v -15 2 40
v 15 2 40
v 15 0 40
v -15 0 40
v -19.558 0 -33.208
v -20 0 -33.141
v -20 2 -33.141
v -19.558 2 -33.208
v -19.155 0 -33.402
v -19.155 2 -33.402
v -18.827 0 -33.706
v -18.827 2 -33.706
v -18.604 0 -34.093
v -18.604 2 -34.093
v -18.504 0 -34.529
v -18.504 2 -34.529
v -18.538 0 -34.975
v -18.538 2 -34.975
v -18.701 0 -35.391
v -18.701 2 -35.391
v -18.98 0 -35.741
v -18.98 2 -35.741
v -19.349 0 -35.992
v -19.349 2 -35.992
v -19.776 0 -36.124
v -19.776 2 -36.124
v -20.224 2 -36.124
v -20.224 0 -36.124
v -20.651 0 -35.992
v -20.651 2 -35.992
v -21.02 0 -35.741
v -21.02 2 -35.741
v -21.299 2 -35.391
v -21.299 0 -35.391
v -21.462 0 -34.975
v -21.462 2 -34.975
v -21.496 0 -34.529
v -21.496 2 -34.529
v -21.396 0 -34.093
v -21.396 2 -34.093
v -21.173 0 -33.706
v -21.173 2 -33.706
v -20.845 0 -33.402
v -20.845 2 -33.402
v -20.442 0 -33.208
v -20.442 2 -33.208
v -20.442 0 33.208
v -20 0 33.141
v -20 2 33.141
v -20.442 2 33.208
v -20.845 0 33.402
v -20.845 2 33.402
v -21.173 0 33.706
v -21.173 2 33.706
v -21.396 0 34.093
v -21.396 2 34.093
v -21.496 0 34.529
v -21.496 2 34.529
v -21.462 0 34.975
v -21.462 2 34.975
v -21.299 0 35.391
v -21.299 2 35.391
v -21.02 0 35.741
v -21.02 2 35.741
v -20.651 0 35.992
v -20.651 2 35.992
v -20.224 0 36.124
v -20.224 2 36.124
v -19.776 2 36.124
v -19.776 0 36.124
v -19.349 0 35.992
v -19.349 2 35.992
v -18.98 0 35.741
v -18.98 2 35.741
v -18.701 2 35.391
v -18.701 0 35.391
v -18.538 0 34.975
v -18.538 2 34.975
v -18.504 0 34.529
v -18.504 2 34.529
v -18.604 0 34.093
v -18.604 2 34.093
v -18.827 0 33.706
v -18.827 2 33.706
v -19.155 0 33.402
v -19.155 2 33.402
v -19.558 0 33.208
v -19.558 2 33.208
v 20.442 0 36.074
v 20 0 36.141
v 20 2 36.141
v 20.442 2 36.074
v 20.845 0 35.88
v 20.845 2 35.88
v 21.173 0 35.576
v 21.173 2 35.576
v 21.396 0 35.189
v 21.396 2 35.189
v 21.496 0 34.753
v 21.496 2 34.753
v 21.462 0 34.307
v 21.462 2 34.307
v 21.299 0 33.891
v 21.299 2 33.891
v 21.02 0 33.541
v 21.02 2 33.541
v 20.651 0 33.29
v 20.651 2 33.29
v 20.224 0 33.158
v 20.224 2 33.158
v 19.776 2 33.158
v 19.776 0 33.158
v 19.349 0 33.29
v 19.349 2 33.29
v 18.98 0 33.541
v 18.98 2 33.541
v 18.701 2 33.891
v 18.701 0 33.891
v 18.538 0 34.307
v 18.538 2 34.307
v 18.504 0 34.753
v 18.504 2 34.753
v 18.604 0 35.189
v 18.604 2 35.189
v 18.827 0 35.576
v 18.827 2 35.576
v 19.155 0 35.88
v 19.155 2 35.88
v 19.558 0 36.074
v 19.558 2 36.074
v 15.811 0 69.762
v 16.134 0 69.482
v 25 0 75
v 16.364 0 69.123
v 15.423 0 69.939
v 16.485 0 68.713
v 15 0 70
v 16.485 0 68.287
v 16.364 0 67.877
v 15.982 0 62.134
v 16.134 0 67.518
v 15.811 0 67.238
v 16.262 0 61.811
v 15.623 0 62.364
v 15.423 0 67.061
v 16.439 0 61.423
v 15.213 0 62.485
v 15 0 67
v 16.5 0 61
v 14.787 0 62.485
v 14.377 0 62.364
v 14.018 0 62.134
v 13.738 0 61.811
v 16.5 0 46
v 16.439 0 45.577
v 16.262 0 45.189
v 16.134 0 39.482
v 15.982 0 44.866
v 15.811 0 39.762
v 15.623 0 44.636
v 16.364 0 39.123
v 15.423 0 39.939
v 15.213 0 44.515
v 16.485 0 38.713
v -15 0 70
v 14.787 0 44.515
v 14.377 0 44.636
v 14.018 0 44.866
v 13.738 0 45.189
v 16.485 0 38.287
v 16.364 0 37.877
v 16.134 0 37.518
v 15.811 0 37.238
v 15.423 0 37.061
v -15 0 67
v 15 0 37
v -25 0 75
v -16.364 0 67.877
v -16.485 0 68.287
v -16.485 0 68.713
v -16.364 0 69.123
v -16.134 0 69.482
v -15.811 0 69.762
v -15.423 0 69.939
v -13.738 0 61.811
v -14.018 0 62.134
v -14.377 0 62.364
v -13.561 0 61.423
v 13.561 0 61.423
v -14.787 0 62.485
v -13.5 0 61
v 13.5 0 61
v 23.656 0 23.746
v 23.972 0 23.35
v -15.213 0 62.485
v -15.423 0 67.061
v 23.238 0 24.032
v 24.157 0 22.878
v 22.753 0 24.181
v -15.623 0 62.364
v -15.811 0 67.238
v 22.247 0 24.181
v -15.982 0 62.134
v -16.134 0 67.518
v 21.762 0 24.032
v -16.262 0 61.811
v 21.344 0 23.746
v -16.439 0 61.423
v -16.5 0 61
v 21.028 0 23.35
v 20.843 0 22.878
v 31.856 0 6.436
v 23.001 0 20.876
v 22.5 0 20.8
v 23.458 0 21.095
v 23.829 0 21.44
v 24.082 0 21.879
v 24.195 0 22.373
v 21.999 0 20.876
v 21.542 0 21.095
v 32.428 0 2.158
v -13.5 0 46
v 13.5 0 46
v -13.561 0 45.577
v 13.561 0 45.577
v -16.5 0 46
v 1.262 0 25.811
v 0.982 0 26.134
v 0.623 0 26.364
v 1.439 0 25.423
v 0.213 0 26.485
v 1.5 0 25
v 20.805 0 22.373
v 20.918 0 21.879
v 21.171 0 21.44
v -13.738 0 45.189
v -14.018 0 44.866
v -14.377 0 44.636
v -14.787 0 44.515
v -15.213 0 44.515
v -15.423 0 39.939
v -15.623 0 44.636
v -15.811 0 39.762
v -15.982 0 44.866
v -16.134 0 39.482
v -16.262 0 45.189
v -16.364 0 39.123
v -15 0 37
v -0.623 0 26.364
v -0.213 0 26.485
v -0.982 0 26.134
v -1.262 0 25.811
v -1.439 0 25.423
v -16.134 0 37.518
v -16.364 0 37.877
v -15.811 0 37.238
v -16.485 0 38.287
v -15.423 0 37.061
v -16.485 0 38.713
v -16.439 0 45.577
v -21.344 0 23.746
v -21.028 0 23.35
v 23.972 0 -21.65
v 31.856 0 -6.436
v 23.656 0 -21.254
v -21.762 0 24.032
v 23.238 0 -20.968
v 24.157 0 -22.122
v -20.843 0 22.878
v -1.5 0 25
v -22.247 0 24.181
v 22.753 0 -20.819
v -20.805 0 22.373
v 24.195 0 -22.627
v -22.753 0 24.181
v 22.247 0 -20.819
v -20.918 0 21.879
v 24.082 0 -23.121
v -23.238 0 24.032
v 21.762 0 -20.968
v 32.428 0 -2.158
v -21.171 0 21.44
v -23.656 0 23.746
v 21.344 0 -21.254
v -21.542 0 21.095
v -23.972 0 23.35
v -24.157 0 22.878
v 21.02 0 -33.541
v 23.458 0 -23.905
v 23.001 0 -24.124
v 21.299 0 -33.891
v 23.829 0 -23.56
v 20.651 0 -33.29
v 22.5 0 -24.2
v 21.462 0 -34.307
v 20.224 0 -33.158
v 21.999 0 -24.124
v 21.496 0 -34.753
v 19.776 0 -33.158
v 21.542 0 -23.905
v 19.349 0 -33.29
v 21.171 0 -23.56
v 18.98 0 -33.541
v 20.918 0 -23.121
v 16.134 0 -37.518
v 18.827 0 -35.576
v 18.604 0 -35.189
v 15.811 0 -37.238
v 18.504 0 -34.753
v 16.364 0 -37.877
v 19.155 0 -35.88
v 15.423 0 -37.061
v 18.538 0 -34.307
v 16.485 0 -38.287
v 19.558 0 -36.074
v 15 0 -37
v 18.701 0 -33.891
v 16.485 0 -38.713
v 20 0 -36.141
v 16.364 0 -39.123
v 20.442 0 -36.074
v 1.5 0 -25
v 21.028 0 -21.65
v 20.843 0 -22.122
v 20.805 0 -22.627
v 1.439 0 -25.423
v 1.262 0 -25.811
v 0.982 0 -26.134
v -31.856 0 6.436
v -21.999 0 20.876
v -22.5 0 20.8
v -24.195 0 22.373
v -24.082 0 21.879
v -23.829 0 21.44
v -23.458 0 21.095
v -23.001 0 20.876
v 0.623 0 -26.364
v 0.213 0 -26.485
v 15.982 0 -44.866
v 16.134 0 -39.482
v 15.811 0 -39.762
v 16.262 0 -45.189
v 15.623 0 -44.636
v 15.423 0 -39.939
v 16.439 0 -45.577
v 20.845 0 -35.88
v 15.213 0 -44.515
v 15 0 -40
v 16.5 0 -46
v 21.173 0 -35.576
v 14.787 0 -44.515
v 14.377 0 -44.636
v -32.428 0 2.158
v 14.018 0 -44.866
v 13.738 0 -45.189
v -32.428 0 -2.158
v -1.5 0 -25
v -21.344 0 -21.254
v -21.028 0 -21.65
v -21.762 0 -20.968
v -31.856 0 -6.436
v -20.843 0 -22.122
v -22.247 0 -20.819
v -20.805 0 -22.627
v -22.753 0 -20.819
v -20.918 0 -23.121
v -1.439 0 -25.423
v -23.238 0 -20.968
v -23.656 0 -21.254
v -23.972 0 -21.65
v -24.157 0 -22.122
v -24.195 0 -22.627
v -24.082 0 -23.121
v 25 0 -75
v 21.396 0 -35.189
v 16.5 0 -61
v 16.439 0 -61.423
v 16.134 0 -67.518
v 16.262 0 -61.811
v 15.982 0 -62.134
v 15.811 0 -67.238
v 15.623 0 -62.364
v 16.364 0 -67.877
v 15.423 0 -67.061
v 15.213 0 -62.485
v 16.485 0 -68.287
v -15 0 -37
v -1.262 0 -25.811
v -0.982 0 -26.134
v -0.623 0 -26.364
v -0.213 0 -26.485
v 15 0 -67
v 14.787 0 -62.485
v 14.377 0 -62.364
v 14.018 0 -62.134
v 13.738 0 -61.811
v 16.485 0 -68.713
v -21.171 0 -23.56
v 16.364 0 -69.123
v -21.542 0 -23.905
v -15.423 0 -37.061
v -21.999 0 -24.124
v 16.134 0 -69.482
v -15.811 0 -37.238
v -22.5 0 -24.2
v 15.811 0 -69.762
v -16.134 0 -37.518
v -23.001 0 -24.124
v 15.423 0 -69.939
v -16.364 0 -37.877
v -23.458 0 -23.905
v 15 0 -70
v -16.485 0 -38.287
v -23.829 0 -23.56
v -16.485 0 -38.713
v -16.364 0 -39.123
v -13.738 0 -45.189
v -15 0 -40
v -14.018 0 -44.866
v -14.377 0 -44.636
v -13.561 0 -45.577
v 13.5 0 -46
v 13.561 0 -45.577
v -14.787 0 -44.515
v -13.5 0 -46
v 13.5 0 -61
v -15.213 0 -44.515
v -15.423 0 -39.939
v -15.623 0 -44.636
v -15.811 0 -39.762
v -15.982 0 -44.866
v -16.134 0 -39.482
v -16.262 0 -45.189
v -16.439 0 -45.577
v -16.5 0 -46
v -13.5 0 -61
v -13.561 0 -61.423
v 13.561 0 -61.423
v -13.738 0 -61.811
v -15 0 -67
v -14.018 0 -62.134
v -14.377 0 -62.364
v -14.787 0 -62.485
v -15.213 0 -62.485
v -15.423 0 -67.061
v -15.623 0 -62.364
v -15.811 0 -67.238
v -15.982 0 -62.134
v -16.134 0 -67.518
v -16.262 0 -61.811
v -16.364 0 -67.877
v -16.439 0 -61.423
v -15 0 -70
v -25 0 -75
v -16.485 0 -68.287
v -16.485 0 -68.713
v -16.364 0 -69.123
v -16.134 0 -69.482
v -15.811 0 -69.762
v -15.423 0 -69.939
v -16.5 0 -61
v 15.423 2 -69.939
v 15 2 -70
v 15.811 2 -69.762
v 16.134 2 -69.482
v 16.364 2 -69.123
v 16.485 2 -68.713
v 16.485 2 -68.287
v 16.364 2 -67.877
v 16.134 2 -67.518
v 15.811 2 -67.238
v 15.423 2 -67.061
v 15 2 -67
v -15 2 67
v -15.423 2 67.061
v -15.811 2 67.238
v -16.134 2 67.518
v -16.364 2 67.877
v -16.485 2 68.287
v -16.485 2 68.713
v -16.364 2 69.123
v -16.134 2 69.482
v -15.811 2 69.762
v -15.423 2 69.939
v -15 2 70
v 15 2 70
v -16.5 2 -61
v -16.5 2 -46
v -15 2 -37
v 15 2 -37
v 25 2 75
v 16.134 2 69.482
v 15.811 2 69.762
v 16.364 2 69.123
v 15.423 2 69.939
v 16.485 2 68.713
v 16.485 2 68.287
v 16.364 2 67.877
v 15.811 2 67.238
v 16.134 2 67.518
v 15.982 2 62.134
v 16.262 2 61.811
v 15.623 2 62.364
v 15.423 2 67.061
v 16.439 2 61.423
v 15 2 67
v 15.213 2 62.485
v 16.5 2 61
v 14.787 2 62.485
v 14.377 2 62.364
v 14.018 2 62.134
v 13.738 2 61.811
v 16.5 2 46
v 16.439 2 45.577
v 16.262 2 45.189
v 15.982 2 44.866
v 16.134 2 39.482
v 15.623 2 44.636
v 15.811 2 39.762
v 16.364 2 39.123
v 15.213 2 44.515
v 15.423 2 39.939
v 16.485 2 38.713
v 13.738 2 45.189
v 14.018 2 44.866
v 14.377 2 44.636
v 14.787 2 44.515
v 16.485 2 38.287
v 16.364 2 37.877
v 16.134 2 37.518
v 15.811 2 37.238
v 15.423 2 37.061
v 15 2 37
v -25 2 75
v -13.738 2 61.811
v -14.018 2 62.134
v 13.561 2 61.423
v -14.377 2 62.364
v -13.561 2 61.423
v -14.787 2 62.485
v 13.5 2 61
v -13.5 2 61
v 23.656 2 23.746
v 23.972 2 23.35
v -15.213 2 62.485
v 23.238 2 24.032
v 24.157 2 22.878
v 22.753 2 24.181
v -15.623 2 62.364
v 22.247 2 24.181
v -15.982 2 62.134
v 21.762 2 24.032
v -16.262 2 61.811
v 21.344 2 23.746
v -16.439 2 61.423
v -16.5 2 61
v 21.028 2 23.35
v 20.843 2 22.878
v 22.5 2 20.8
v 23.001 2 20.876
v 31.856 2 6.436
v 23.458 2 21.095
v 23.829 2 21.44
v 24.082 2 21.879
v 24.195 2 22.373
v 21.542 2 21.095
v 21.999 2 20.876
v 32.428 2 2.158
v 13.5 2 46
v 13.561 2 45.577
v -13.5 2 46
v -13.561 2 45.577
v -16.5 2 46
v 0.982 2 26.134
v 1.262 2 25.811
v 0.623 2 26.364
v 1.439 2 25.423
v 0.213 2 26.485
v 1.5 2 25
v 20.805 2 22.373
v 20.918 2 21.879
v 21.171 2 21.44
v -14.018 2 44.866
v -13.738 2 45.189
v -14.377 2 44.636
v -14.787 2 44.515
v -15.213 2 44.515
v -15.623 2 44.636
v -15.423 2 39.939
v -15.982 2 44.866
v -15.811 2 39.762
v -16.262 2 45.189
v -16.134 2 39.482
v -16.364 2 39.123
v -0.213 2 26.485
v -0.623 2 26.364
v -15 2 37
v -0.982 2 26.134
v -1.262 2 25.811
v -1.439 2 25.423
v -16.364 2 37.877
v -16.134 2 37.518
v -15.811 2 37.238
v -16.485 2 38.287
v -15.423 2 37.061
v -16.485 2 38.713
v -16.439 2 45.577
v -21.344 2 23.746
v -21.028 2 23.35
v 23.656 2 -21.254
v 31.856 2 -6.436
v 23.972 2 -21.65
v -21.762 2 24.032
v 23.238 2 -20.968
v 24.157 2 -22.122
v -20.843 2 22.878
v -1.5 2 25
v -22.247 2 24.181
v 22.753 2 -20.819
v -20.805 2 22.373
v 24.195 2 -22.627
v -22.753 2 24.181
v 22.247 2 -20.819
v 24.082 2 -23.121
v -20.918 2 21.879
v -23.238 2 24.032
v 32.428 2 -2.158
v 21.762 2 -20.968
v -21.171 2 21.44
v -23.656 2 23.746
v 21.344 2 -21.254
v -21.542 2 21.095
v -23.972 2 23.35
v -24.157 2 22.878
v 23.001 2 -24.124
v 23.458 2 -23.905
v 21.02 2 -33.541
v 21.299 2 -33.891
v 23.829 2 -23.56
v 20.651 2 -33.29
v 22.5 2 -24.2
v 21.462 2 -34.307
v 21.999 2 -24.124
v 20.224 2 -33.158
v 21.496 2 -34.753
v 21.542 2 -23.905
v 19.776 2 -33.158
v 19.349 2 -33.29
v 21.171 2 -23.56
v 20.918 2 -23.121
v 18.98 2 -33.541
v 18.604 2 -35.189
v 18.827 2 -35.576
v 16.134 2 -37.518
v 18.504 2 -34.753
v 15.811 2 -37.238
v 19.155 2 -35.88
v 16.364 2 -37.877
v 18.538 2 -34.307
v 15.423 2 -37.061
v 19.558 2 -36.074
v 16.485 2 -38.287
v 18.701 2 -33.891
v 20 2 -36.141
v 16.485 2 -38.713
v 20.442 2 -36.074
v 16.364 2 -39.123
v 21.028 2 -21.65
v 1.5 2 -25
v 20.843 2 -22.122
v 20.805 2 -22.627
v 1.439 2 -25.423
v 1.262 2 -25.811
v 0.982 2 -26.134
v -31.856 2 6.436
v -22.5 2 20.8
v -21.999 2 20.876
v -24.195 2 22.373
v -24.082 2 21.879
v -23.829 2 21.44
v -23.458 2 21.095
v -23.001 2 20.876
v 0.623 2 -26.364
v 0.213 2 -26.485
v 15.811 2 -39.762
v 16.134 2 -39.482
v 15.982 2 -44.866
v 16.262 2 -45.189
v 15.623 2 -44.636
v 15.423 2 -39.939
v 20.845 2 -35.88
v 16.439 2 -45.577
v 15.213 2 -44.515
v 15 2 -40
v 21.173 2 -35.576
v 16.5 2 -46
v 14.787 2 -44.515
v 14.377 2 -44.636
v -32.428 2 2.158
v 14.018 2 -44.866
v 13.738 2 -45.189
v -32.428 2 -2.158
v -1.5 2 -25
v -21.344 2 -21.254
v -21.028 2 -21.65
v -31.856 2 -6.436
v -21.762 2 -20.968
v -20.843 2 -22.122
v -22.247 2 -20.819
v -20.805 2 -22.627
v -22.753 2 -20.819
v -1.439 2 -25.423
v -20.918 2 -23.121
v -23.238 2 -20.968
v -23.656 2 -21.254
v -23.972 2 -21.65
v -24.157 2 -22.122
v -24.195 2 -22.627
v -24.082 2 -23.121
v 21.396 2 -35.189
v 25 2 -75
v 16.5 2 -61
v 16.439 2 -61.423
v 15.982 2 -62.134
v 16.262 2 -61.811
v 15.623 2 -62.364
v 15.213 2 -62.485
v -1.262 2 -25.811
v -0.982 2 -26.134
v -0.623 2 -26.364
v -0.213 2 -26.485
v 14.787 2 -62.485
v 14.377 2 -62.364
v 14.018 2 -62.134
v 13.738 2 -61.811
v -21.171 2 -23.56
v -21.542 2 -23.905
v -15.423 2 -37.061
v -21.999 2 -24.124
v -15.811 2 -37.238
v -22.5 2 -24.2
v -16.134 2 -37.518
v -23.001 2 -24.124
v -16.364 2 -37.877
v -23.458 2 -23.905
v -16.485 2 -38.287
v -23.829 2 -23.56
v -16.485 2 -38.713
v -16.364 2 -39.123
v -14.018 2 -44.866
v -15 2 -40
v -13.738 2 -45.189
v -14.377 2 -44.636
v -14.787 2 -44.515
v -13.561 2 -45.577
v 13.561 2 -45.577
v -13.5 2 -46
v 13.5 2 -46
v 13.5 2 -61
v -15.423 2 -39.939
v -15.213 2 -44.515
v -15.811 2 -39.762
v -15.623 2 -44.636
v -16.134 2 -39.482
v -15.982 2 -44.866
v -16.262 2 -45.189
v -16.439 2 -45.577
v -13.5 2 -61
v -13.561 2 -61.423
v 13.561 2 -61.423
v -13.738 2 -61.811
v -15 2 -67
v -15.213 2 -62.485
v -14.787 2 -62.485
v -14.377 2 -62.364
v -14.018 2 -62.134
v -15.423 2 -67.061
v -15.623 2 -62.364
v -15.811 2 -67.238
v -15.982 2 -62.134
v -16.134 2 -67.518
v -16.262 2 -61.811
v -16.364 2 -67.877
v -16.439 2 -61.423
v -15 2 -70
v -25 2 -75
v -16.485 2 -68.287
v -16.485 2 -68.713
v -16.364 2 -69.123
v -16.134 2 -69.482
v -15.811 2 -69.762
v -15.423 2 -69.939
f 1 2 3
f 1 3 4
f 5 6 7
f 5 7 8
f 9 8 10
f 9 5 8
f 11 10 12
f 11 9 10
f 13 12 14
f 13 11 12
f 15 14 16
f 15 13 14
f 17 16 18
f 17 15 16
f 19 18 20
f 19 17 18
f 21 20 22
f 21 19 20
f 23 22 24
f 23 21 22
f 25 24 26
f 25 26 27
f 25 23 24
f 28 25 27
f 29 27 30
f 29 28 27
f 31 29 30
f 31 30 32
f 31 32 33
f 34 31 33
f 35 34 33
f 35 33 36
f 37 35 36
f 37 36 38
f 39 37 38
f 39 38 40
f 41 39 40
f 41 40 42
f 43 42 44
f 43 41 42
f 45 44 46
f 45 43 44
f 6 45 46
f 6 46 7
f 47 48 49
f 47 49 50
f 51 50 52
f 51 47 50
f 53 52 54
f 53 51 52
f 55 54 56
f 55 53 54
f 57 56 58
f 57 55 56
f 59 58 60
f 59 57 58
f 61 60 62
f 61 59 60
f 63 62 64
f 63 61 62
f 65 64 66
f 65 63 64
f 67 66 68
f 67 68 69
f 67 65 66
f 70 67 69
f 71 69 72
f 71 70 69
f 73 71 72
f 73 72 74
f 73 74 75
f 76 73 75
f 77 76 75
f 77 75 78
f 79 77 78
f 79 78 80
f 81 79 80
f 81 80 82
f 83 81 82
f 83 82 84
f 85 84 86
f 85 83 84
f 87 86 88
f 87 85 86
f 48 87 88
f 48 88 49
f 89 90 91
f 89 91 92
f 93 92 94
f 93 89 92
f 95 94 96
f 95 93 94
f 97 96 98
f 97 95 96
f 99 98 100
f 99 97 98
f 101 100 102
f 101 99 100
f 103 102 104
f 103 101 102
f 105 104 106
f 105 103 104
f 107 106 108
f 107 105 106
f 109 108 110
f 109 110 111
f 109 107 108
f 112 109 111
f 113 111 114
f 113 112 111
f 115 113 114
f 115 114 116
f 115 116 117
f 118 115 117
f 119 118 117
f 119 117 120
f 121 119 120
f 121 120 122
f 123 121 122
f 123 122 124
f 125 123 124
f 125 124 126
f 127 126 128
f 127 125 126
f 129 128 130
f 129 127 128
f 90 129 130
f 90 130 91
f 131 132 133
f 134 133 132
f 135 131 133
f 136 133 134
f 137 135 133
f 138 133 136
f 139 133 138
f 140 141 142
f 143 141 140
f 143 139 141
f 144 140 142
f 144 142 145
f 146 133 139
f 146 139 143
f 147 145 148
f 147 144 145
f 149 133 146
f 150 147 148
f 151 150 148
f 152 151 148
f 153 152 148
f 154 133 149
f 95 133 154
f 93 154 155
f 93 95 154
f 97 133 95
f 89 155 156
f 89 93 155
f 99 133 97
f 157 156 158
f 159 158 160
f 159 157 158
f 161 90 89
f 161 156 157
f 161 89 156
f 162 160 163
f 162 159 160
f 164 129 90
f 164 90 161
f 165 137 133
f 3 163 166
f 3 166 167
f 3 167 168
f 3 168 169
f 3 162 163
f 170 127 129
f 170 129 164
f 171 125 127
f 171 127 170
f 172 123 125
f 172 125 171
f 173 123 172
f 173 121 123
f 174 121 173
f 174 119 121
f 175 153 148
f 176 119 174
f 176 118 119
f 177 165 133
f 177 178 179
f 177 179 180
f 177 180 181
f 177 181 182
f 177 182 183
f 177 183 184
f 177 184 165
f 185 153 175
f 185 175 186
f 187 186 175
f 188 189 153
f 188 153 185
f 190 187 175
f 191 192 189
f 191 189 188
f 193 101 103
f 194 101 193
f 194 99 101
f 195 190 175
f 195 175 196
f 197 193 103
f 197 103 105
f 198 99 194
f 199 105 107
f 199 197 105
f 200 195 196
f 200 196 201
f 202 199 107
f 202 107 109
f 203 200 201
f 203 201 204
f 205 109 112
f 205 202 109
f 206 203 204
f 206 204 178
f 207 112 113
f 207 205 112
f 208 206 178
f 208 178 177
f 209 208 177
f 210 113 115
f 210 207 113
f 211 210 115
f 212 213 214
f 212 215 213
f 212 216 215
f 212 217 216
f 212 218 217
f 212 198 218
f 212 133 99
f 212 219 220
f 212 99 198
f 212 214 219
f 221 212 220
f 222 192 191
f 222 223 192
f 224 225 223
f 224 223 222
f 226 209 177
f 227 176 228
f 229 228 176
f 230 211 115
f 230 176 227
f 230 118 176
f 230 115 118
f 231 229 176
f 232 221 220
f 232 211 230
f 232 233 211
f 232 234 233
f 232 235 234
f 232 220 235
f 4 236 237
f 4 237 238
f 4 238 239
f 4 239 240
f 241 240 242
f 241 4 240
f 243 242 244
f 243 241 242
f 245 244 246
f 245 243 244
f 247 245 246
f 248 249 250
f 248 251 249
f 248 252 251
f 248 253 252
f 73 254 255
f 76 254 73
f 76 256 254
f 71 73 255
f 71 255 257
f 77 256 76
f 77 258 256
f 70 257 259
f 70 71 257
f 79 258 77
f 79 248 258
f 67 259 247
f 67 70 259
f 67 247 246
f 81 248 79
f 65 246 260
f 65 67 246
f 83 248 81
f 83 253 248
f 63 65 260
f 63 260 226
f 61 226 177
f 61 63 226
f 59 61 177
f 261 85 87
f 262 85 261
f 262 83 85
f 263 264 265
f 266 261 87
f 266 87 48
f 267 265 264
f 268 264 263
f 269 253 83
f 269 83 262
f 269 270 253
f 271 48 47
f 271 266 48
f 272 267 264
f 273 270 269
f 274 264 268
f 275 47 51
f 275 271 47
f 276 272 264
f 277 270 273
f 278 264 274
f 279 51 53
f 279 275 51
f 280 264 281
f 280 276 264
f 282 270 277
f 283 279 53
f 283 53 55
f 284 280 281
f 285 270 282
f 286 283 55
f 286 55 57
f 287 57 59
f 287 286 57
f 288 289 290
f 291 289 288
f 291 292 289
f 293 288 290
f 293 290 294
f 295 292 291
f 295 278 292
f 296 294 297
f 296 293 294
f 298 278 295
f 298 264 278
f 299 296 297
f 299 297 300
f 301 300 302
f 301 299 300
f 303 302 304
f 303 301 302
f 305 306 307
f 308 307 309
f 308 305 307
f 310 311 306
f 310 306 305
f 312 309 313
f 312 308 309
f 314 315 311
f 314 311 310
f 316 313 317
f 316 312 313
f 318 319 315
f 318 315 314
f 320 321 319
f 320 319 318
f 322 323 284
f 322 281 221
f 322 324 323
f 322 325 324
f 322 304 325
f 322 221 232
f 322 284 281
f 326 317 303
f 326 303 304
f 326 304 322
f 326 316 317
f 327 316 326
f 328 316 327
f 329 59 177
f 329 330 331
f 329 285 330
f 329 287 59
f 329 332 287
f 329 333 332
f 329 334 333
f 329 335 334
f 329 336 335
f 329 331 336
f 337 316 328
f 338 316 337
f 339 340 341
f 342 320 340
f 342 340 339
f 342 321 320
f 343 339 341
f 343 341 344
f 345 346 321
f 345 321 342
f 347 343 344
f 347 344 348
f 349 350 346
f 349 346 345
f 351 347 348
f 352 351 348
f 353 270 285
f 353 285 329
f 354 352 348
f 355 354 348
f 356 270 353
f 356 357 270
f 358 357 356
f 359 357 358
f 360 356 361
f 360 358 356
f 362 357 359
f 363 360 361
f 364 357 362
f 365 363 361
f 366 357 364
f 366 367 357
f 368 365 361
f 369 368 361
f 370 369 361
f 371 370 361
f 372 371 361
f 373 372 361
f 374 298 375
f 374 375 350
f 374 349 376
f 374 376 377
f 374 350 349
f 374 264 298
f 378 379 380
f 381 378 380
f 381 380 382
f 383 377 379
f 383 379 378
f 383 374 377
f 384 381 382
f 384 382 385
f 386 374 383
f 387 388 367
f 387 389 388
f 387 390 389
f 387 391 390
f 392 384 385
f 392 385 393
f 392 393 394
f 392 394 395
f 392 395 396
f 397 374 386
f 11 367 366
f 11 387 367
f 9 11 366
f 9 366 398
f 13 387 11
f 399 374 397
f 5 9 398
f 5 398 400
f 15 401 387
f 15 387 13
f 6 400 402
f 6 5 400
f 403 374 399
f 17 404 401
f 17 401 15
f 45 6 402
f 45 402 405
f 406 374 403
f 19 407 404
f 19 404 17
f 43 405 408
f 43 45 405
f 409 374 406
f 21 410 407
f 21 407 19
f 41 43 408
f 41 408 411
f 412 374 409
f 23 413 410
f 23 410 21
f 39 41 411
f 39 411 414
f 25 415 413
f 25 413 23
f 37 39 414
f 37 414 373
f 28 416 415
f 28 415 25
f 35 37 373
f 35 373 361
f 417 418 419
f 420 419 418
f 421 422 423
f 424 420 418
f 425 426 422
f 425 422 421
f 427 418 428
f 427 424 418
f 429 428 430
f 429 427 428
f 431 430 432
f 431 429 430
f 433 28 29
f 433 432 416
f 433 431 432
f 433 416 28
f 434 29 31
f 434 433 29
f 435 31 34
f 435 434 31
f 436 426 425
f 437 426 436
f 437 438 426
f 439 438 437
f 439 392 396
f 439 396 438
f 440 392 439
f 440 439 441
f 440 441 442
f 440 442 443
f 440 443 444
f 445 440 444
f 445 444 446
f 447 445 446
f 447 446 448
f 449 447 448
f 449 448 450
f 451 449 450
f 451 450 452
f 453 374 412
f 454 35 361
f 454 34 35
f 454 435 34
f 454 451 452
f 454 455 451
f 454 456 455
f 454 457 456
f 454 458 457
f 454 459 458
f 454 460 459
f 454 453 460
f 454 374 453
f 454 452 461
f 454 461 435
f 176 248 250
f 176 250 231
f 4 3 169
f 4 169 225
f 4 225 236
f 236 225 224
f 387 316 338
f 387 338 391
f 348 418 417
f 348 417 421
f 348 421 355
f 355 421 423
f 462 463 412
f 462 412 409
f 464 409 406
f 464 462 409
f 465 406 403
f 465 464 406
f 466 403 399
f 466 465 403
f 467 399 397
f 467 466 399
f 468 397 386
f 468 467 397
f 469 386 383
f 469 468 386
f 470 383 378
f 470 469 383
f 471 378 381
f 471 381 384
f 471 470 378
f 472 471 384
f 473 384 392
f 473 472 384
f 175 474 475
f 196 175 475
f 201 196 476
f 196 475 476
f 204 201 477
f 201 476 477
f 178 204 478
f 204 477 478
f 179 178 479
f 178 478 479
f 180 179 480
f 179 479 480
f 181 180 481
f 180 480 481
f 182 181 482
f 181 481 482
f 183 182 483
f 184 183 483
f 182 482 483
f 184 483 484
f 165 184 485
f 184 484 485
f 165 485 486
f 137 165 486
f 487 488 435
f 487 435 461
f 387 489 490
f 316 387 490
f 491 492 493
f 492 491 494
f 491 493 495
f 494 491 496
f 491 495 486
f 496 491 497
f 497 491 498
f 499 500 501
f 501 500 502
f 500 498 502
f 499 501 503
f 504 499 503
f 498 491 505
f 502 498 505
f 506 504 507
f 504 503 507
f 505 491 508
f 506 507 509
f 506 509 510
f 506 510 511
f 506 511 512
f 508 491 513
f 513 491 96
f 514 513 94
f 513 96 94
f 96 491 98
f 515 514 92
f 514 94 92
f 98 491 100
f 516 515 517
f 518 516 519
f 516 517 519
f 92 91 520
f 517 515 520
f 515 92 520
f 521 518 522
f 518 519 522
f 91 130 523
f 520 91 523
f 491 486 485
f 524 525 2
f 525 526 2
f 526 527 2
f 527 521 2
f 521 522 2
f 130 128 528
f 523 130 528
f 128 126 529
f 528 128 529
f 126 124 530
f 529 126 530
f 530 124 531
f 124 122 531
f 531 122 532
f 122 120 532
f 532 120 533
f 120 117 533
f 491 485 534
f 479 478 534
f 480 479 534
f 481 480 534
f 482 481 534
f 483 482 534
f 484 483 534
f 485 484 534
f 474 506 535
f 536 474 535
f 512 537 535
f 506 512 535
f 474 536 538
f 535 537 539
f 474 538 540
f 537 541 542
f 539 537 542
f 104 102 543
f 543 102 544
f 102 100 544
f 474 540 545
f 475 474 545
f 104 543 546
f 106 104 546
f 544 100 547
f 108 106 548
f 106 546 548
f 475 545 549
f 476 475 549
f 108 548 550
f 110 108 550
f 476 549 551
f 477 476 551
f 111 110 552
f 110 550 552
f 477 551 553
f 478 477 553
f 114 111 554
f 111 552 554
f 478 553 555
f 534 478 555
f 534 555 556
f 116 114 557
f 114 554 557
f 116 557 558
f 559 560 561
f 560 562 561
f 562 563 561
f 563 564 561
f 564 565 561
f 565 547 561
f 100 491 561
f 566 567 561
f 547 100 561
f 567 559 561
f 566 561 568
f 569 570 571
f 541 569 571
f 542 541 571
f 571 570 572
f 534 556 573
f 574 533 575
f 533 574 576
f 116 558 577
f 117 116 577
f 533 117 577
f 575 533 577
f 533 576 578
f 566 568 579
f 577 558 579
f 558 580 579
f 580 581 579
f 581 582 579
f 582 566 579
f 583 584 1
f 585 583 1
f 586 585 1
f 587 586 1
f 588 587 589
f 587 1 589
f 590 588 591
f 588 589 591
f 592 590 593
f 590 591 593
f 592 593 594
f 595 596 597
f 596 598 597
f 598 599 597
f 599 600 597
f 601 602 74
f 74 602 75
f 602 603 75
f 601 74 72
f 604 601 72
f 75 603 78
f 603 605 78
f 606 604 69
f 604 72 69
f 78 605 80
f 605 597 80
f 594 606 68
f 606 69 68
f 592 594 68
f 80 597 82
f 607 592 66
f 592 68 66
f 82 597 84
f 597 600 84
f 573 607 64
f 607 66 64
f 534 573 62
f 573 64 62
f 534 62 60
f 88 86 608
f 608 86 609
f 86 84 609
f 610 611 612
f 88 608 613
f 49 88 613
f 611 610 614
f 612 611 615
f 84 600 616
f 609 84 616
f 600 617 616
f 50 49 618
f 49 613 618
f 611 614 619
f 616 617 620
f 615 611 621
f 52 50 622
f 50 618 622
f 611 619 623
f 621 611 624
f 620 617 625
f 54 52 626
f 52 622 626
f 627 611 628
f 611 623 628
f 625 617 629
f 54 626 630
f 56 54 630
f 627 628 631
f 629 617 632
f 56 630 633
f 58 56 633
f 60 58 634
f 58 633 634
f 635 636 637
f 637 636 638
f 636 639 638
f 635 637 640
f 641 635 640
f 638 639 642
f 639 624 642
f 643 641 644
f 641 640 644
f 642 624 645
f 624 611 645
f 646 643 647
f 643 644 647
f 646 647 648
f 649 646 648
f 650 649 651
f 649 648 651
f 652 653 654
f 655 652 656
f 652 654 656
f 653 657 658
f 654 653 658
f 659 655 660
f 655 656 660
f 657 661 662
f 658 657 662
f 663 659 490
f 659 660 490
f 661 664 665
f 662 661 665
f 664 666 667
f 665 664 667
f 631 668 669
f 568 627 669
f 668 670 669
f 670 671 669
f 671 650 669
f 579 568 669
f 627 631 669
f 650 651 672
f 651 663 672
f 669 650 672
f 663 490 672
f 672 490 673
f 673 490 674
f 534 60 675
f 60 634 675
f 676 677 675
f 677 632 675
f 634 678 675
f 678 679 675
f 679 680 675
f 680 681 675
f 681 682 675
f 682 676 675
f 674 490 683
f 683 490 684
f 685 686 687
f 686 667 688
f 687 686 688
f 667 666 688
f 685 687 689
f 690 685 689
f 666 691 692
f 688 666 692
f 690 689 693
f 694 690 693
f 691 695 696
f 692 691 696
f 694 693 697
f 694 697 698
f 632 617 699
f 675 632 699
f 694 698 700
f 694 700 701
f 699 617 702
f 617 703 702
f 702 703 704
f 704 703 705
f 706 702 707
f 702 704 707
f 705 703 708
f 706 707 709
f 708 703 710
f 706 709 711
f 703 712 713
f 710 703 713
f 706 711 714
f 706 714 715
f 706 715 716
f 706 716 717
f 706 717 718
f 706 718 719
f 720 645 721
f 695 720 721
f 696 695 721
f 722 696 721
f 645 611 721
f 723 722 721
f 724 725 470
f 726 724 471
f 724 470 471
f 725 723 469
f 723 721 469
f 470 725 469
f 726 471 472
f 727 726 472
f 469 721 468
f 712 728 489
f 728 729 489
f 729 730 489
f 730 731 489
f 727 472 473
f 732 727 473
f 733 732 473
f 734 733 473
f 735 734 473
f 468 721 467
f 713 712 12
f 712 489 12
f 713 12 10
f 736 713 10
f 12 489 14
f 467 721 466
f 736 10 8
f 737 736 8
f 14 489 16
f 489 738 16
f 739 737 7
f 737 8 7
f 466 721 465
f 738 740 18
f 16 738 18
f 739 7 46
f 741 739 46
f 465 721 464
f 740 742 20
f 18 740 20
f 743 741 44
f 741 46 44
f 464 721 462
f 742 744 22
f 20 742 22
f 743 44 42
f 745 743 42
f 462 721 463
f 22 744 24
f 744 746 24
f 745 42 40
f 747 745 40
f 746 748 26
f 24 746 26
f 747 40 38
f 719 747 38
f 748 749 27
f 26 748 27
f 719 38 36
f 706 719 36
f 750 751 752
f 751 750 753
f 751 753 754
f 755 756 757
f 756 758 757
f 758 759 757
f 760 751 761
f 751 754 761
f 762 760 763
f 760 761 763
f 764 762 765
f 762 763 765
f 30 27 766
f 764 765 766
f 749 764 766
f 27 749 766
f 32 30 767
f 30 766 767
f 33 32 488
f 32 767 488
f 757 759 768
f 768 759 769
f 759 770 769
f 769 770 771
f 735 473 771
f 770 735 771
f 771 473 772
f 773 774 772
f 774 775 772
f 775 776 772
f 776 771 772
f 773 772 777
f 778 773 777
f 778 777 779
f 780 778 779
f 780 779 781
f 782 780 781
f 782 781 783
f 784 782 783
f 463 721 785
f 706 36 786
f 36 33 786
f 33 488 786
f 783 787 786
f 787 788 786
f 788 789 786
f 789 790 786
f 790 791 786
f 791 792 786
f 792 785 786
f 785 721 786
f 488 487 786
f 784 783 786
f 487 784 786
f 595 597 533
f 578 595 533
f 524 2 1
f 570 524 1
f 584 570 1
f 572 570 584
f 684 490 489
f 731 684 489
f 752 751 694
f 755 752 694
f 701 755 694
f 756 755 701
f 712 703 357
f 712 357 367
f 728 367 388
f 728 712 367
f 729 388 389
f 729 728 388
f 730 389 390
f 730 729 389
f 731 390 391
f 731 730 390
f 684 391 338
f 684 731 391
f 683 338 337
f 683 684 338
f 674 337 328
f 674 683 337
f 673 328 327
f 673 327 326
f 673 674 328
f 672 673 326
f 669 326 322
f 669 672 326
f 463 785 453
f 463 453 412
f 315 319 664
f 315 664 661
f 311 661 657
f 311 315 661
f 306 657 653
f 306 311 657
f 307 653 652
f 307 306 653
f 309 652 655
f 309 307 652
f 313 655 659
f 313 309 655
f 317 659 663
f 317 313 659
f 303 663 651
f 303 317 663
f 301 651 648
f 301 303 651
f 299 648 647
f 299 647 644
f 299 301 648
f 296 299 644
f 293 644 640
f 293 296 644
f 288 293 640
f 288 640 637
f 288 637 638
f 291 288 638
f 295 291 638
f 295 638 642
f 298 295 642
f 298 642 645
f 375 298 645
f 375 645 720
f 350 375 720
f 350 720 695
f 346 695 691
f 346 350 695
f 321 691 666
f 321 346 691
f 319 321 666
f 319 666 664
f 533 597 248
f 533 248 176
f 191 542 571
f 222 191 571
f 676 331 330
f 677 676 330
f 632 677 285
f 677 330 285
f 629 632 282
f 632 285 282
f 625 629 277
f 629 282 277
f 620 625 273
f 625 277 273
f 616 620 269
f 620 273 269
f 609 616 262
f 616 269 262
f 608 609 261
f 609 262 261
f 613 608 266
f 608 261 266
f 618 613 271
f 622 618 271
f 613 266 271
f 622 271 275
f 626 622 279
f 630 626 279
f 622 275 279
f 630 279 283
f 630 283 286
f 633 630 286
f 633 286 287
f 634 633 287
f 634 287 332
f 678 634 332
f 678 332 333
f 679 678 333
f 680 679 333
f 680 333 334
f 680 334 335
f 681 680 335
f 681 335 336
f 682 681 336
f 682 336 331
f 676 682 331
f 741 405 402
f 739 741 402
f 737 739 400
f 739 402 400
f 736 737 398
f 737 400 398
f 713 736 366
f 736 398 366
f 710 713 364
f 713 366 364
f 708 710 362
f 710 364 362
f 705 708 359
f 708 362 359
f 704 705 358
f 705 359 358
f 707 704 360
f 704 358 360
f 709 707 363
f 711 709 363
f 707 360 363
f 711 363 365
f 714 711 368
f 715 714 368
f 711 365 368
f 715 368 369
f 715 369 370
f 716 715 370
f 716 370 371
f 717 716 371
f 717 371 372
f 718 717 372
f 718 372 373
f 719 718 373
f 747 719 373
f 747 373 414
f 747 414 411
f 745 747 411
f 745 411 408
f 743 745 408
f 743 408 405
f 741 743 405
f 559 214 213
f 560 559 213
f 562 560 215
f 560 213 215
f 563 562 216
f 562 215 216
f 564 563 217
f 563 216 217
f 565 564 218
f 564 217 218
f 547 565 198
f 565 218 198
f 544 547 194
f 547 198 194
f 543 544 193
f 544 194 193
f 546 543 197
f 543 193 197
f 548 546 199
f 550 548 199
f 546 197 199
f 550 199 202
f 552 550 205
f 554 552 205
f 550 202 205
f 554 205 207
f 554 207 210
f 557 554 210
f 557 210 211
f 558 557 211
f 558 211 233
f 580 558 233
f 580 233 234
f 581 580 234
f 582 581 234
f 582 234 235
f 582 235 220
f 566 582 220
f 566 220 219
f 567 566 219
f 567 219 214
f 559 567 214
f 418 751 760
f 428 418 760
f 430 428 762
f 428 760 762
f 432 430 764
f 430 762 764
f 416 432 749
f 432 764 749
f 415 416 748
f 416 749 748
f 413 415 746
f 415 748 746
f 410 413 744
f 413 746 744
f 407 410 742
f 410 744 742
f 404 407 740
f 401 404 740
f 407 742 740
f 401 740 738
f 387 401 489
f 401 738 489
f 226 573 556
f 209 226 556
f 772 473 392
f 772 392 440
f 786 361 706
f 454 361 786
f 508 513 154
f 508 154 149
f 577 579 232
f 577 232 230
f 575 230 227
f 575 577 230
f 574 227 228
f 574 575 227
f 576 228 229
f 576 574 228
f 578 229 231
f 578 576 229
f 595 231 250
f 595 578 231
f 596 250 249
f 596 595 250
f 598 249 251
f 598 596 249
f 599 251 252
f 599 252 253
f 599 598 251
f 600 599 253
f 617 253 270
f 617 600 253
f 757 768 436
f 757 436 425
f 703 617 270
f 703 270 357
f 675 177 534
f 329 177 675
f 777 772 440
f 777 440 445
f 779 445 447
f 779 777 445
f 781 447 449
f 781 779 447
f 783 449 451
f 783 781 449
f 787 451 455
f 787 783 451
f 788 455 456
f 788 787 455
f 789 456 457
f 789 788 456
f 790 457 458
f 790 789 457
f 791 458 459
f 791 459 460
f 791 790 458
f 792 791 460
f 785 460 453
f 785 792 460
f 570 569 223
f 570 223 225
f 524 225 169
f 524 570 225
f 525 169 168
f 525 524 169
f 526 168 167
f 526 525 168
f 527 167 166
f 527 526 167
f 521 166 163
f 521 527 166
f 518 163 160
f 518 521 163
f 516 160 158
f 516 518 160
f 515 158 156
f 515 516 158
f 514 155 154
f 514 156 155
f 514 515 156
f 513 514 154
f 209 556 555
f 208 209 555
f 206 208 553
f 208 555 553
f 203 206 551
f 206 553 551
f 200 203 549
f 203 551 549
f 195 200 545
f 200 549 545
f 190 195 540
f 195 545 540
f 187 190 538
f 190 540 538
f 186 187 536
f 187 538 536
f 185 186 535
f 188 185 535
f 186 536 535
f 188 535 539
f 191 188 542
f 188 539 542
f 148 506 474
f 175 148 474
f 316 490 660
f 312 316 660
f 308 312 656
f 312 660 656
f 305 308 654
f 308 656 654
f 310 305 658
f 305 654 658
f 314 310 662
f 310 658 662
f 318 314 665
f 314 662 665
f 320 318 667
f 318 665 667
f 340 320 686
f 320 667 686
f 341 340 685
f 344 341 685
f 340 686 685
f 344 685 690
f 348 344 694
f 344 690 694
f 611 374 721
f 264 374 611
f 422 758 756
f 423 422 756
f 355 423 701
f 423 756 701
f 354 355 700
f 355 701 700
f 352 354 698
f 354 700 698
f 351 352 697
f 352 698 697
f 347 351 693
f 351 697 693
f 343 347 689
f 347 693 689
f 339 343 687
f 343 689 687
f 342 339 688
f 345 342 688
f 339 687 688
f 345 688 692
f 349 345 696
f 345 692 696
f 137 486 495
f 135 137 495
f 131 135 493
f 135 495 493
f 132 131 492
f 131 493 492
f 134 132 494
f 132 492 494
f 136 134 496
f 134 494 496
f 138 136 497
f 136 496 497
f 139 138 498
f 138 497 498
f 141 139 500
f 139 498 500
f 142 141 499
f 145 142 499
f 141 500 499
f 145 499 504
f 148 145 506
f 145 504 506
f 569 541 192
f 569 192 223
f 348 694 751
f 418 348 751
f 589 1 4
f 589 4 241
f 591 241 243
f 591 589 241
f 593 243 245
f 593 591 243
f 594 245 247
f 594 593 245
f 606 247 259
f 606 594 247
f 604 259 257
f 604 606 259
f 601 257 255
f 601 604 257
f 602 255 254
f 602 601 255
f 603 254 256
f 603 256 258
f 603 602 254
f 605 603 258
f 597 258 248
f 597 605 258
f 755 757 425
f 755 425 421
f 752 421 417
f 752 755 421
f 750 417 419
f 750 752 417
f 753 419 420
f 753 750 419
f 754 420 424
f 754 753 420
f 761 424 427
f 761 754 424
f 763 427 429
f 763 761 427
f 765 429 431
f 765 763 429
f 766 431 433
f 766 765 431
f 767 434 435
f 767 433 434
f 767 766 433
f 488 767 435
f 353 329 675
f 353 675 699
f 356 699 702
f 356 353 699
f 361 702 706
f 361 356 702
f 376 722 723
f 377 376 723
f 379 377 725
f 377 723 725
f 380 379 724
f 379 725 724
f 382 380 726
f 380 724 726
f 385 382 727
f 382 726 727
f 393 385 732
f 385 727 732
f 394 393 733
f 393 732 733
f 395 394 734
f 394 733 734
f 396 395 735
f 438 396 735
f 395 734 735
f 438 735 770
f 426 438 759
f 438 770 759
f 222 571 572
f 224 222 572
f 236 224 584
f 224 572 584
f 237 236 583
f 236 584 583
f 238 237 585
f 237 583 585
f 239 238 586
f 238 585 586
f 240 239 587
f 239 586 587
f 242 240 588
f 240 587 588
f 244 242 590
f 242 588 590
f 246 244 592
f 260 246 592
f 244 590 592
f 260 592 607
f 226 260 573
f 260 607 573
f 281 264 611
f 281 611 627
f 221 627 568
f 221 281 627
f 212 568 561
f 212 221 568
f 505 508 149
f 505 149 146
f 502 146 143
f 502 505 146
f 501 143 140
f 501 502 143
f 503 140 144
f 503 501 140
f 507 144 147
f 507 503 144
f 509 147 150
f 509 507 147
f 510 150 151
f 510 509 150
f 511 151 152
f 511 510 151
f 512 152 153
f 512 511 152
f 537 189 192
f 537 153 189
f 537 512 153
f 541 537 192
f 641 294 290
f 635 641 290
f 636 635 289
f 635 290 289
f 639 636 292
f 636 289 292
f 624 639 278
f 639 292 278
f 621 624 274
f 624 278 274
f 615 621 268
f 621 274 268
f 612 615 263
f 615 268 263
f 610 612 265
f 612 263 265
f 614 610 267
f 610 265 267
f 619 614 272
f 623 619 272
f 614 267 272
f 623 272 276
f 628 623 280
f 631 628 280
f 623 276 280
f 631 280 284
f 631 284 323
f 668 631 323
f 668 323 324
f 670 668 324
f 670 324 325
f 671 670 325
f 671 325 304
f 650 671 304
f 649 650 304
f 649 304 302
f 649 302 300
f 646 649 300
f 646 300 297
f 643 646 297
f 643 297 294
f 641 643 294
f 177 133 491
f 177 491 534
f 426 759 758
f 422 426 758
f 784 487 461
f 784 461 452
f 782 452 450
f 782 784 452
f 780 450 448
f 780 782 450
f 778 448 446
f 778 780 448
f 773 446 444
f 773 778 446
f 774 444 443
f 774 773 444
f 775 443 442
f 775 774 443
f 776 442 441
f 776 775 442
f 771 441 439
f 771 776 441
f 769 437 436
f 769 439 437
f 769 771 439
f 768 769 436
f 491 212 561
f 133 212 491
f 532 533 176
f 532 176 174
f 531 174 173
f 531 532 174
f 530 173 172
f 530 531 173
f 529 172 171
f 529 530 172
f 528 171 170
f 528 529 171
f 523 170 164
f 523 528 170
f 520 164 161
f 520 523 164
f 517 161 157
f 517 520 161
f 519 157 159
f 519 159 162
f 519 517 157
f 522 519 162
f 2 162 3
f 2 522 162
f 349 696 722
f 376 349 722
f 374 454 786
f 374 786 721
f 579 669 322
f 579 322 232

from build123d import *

# Parameters (mm, degrees)
SKETCH1_R                = 1.5
BOSS_EXTRUDE1_DEPTH      = 2
CUT_EXTRUDE1_DEPTH       = 2
M3_CLEARANCE_HOLE1_D     = 3.4
M3_CLEARANCE_HOLE1_DEPTH = 10
M3_CLEARANCE_HOLE1_TIP   = 1.021463052
CUT_EXTRUDE4_DEPTH       = 10


with BuildPart() as part:
    # Sketch1 → Boss-Extrude1 (new body)
    with BuildSketch(Plane(origin=(0, 0, 0), x_dir=(1, 0, 0), z_dir=(0, 1, 0))):
        with BuildLine():
            Line((-31.856435644, 6.435643564), (-25, 75))
            Line((-25, 75), (25, 75))
            Line((25, 75), (31.856435644, 6.435643564))
            ThreePointArc((31.856435644, 6.435643564), (32.5, 0), (31.856435644, -6.435643564))
            Line((31.856435644, -6.435643564), (25, -75))
            Line((25, -75), (-25, -75))
            Line((-25, -75), (-31.856435644, -6.435643564))
            ThreePointArc((-31.856435644, -6.435643564), (-32.5, 0), (-31.856435644, 6.435643564))
        make_face()
        with Locations(Location((-20, 34.641016151, 0), (0, 0, 270))):
            Circle(SKETCH1_R, mode=Mode.SUBTRACT)
        with Locations(Location((20, 34.641016151, 0), (0, 0, 90))):
            Circle(SKETCH1_R, mode=Mode.SUBTRACT)
        with Locations(Location((20, -34.641016151, 0), (0, 0, 270))):
            Circle(SKETCH1_R, mode=Mode.SUBTRACT)
        with Locations(Location((-20, -34.641016151, 0), (0, 0, 90))):
            Circle(SKETCH1_R, mode=Mode.SUBTRACT)
    extrude(amount=BOSS_EXTRUDE1_DEPTH)

    # Sketch2 → Cut-Extrude1 (cut)
    with BuildSketch(Plane(origin=(0, 2, 0), x_dir=(1, 0, 0), z_dir=(0, 1, 0))):
        with BuildLine():
            Line((-15, 70), (15, 70))
            ThreePointArc((15, 70), (16.5, 68.5), (15, 67))
            Line((15, 67), (-15, 67))
            ThreePointArc((-15, 67), (-16.5, 68.5), (-15, 70))
        make_face()
        with BuildLine():
            Line((-15, -70), (15, -70))
            ThreePointArc((15, -70), (16.5, -68.5), (15, -67))
            Line((15, -67), (-15, -67))
            ThreePointArc((-15, -67), (-16.5, -68.5), (-15, -70))
        make_face()
        with BuildLine():
            Line((-15, 37), (15, 37))
            ThreePointArc((15, 37), (16.5, 38.5), (15, 40))
            Line((15, 40), (-15, 40))
            ThreePointArc((-15, 40), (-16.5, 38.5), (-15, 37))
        make_face()
        with BuildLine():
            Line((-15, -37), (15, -37))
            ThreePointArc((15, -37), (16.5, -38.5), (15, -40))
            Line((15, -40), (-15, -40))
            ThreePointArc((-15, -40), (-16.5, -38.5), (-15, -37))
        make_face()
        with BuildLine():
            Line((1.5, 25), (1.5, -25))
            ThreePointArc((1.5, -25), (0, -26.5), (-1.5, -25))
            Line((-1.5, -25), (-1.5, 25))
            ThreePointArc((-1.5, 25), (0, 26.5), (1.5, 25))
        make_face()
    extrude(amount=-CUT_EXTRUDE1_DEPTH, mode=Mode.SUBTRACT)

    # M3 Clearance Hole1
    with Locations(Plane(origin=(-22.5, 2, -22.5), x_dir=(0, 0, 1), z_dir=(0, 1, 0))):
        with Locations((0, 0), (0, 45), (45, 45), (45, 0)):
            Hole(M3_CLEARANCE_HOLE1_D / 2, depth=M3_CLEARANCE_HOLE1_DEPTH)
            with Locations((0, 0, -(M3_CLEARANCE_HOLE1_DEPTH + M3_CLEARANCE_HOLE1_TIP / 2))):  # 118° drill point
                Cone(0, M3_CLEARANCE_HOLE1_D / 2, M3_CLEARANCE_HOLE1_TIP, mode=Mode.SUBTRACT)

    # Sketch11 → Cut-Extrude4 (cut)
    with BuildSketch(Plane(origin=(0, 2, 0), x_dir=(1, 0, 0), z_dir=(0, 1, 0))):
        with BuildLine():
            Line((16.5, -46), (16.5, -61))
            ThreePointArc((16.5, -61), (15, -62.5), (13.5, -61))
            Line((13.5, -61), (13.5, -46))
            ThreePointArc((13.5, -46), (15, -44.5), (16.5, -46))
        make_face()
        with BuildLine():
            Line((-16.5, -46), (-16.5, -61))
            ThreePointArc((-16.5, -61), (-15, -62.5), (-13.5, -61))
            Line((-13.5, -61), (-13.5, -46))
            ThreePointArc((-13.5, -46), (-15, -44.5), (-16.5, -46))
        make_face()
        with BuildLine():
            Line((-16.5, 46), (-16.5, 61))
            ThreePointArc((-16.5, 61), (-15, 62.5), (-13.5, 61))
            Line((-13.5, 61), (-13.5, 46))
            ThreePointArc((-13.5, 46), (-15, 44.5), (-16.5, 46))
        make_face()
        with BuildLine():
            Line((16.5, 46), (16.5, 61))
            ThreePointArc((16.5, 61), (15, 62.5), (13.5, 61))
            Line((13.5, 61), (13.5, 46))
            ThreePointArc((13.5, 46), (15, 44.5), (16.5, 46))
        make_face()
    extrude(amount=-CUT_EXTRUDE4_DEPTH, mode=Mode.SUBTRACT)


solid = part.part
